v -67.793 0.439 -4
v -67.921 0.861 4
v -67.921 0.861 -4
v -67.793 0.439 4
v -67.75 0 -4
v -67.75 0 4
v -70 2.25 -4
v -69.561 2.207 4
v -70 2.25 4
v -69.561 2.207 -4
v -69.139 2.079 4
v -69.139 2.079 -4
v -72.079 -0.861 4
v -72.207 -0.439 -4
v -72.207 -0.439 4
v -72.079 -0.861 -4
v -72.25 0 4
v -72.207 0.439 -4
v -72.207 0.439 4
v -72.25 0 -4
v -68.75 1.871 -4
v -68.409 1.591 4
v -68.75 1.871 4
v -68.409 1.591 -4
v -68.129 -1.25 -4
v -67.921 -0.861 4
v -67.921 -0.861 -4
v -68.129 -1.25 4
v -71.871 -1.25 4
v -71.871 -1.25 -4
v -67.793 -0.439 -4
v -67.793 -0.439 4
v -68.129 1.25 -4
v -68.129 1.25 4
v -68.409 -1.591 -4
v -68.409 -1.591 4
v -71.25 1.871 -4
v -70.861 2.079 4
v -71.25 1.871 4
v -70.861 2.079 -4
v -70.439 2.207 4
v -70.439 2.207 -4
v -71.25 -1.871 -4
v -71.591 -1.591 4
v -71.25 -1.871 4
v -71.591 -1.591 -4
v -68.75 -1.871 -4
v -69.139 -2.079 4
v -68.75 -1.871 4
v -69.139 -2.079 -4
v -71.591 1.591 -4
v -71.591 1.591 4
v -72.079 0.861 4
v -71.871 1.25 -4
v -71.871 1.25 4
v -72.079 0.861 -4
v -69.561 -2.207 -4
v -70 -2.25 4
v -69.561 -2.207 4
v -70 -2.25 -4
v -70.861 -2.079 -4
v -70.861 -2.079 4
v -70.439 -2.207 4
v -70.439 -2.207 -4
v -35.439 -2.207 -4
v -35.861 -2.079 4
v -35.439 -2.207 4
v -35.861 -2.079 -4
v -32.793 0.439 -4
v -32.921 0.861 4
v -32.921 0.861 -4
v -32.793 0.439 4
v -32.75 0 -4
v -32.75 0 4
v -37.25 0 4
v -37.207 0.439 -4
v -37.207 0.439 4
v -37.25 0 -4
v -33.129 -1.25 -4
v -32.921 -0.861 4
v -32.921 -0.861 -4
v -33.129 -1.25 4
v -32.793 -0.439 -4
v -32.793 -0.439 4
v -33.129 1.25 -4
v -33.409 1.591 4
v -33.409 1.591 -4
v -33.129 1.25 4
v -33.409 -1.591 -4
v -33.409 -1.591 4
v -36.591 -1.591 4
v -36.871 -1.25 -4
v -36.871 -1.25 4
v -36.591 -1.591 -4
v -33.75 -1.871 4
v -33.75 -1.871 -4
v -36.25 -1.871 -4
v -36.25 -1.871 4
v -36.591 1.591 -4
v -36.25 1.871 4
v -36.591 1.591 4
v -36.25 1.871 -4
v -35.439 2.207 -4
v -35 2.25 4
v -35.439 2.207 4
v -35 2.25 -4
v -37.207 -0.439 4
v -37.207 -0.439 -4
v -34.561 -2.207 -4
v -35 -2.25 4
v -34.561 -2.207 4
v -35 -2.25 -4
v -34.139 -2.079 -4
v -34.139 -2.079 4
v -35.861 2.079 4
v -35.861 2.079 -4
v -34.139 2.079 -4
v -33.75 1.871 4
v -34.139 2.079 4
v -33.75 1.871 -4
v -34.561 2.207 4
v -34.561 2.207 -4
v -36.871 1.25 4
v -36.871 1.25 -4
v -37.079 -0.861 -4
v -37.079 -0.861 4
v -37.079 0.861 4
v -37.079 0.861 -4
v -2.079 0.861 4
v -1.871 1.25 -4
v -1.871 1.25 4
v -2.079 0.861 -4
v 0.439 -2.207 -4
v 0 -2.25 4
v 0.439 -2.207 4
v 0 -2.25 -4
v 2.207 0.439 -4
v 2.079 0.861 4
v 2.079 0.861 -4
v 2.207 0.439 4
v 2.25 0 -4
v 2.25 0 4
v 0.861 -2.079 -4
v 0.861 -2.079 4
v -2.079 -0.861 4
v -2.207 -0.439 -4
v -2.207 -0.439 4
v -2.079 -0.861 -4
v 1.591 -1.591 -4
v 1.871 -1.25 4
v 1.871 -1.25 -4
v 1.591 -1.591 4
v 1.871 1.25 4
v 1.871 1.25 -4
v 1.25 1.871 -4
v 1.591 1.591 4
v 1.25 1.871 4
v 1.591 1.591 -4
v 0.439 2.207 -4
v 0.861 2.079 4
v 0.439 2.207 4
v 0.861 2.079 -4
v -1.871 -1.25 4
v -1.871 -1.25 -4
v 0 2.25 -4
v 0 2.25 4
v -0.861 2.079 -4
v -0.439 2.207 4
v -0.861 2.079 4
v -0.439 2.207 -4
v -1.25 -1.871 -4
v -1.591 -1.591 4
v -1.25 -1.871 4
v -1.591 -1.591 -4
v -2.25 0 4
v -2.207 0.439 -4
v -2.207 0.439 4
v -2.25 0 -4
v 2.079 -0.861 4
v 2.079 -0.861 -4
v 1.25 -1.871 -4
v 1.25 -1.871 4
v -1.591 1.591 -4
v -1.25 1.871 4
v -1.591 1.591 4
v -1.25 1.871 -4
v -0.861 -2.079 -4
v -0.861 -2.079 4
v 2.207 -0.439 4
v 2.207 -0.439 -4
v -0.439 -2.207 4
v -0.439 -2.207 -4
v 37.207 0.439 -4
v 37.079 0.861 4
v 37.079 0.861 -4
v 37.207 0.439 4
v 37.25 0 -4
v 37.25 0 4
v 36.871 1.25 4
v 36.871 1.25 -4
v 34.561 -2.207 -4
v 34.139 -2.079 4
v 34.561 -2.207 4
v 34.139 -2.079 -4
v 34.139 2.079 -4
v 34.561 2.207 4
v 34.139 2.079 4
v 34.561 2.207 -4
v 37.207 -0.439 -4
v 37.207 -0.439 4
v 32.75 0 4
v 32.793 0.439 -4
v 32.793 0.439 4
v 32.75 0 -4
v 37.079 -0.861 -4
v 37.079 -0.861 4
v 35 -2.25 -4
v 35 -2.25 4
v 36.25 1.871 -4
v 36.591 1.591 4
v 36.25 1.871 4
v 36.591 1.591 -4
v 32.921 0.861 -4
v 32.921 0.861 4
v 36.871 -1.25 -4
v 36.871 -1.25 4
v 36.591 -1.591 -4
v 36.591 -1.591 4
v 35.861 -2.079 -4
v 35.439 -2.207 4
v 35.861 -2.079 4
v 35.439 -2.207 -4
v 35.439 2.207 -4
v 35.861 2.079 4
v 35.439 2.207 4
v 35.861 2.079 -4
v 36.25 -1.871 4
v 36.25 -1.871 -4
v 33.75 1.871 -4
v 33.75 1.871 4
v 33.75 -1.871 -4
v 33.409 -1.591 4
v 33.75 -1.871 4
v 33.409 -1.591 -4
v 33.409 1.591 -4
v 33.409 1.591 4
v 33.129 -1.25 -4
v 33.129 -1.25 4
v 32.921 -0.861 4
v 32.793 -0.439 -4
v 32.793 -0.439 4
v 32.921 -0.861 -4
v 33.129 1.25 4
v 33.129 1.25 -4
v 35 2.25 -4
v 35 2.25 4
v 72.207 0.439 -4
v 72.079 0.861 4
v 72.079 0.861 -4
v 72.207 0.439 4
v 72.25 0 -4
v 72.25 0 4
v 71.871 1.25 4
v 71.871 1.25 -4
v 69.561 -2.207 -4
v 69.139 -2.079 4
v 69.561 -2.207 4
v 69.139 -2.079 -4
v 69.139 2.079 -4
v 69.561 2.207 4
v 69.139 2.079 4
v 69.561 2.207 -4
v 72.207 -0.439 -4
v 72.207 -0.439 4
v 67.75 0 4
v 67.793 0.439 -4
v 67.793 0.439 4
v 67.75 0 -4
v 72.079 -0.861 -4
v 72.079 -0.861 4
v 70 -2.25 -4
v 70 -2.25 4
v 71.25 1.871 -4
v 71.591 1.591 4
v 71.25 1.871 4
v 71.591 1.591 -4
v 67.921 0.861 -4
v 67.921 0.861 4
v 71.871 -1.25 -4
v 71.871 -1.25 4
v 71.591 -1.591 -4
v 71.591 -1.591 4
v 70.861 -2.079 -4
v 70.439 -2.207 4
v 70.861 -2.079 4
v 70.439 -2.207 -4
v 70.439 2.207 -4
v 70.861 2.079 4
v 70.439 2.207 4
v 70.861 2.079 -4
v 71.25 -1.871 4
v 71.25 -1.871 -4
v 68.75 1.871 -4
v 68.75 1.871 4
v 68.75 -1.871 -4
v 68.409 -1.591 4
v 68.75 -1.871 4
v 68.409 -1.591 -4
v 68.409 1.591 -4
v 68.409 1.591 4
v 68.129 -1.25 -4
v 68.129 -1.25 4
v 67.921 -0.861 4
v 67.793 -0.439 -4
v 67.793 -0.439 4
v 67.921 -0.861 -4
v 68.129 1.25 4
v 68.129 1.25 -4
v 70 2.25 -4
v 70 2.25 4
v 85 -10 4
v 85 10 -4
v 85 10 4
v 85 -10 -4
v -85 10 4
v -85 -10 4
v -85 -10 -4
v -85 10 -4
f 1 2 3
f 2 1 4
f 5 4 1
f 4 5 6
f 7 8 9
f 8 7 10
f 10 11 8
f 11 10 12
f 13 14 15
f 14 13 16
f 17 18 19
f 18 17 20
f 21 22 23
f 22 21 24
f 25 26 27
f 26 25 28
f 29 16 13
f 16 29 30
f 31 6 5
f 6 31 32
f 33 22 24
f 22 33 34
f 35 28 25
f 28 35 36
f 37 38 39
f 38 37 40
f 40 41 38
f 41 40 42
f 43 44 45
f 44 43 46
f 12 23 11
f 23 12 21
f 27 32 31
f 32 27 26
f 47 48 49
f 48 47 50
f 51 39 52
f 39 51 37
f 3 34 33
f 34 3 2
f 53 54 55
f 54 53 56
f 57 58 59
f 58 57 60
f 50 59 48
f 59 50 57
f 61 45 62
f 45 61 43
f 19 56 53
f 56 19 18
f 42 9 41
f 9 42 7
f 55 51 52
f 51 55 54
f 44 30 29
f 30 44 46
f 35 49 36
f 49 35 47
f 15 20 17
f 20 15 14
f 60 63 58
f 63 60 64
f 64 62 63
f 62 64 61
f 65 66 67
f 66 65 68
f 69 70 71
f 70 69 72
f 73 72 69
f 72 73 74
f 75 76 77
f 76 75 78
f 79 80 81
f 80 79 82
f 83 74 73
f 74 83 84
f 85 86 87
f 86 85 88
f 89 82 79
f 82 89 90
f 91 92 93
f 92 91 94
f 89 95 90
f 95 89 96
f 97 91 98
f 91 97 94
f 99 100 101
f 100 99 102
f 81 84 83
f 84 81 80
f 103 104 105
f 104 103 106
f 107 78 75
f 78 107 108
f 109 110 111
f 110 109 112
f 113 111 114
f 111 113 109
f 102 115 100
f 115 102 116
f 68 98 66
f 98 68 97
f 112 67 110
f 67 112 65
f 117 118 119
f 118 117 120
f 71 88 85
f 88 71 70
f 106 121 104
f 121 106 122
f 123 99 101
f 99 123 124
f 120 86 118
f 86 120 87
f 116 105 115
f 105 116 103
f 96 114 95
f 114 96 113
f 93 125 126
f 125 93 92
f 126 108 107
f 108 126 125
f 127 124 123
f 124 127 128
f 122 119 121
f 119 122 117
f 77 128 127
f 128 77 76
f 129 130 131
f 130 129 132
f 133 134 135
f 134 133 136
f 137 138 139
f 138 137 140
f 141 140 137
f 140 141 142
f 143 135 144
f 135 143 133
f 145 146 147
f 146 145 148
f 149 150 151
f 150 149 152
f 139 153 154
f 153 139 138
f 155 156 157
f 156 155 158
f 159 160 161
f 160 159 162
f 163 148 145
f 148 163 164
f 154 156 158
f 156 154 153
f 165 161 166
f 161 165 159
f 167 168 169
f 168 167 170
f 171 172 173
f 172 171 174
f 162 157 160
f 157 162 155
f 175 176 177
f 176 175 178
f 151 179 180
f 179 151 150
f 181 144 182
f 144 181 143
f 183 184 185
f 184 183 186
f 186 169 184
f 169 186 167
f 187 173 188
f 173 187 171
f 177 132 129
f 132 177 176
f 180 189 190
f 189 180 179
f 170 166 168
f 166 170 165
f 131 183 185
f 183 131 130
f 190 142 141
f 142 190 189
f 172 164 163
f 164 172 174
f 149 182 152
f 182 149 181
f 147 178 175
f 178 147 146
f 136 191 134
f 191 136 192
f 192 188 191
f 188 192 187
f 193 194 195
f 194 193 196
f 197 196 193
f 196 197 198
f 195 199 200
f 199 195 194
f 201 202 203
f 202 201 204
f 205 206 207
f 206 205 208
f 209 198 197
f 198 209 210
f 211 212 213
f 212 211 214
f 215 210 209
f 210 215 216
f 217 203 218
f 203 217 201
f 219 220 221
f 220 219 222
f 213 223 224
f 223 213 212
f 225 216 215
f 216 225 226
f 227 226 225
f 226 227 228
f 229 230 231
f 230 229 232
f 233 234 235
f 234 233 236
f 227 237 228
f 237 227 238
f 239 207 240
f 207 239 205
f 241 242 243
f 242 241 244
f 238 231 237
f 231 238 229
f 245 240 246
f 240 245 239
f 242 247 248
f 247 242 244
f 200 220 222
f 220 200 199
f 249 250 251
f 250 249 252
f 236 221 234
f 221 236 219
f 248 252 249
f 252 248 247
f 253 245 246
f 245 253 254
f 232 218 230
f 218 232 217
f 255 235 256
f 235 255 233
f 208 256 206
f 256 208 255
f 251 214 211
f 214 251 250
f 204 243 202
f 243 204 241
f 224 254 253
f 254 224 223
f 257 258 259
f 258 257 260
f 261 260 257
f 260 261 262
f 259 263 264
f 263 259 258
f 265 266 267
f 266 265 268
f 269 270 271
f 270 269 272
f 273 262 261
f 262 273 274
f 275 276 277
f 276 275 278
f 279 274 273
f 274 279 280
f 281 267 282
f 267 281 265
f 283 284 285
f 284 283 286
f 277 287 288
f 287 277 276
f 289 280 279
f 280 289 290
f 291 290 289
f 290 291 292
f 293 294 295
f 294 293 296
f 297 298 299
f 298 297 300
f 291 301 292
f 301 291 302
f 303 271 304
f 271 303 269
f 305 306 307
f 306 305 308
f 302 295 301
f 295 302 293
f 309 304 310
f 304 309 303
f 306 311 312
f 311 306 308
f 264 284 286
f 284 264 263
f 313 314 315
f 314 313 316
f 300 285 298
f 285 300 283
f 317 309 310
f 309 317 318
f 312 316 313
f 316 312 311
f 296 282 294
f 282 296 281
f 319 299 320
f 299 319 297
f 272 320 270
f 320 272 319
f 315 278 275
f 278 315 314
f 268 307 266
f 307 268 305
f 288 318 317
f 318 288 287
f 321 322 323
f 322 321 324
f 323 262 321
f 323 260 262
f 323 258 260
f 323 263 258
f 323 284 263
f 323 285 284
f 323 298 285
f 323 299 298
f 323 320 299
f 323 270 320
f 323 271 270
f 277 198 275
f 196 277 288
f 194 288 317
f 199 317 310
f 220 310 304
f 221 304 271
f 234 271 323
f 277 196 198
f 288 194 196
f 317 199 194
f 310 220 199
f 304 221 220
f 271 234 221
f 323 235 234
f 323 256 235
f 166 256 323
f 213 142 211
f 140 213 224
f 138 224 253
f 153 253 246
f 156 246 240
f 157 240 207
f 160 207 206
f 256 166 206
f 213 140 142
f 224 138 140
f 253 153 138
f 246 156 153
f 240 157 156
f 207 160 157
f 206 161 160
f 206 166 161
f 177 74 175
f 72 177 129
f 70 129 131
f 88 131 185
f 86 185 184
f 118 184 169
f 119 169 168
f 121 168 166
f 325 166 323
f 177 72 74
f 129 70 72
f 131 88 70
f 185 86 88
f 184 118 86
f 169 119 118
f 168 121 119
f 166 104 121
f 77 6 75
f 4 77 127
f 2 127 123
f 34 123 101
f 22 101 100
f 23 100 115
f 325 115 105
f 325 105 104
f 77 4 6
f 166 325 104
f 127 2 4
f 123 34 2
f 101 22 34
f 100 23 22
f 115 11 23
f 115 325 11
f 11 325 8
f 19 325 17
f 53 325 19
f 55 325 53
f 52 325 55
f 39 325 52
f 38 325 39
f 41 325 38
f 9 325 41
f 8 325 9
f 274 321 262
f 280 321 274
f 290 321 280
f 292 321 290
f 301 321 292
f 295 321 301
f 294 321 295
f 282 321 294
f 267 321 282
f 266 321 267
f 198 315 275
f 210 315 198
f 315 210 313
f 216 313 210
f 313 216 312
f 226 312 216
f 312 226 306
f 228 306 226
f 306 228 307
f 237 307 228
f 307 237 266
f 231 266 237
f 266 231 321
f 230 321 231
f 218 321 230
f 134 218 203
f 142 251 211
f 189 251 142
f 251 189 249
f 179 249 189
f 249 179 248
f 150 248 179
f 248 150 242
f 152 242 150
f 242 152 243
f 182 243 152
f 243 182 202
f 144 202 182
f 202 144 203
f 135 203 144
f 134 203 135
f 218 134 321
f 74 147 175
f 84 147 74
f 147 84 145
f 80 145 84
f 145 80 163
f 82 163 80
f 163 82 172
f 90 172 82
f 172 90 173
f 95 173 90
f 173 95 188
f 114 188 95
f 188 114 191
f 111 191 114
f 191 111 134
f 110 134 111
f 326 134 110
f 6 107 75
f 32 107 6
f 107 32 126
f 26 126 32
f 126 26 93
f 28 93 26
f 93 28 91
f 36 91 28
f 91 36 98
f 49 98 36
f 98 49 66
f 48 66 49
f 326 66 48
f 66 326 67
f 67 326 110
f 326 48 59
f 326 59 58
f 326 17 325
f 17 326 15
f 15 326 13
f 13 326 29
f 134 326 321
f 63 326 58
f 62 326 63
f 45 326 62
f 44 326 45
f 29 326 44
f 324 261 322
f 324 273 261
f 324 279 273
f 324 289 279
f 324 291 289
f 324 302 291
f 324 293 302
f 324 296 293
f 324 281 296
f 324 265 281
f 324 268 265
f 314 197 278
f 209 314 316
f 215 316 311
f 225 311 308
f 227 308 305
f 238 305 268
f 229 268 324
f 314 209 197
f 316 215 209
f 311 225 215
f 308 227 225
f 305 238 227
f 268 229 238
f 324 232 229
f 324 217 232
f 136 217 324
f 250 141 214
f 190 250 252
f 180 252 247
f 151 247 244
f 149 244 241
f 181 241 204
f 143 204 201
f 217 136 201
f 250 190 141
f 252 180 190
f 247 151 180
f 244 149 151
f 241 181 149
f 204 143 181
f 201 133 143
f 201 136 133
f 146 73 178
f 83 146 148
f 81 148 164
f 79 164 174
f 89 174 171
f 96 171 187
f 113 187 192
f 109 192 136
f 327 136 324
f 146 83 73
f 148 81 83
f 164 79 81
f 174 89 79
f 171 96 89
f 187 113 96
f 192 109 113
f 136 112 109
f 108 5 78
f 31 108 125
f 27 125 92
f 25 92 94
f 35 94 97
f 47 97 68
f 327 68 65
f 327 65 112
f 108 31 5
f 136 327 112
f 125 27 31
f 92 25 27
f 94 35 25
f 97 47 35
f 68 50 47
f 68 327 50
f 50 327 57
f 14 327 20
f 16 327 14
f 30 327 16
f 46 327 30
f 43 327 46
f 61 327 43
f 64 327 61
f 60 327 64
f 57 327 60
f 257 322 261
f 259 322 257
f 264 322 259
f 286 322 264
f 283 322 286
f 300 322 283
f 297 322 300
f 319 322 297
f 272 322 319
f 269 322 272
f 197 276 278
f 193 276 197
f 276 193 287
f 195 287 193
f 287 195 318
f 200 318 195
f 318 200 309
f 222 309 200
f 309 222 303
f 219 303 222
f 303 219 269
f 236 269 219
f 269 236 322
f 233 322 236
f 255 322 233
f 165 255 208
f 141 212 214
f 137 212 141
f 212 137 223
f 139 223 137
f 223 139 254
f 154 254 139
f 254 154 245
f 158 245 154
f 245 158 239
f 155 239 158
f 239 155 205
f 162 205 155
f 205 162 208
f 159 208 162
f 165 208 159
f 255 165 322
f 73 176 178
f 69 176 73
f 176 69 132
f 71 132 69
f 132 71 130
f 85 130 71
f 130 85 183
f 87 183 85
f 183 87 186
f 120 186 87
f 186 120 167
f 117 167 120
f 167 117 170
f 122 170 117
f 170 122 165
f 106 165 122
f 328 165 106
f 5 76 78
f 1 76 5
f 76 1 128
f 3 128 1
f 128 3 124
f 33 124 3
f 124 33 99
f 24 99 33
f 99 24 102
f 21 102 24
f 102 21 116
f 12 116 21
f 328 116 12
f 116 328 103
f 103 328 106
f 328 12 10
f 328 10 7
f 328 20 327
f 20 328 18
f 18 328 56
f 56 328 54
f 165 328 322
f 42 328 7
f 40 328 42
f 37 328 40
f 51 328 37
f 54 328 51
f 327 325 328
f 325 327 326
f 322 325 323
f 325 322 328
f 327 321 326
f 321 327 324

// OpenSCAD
$fn = 32;

// ----------------------------------------------------------------------
// Hole bar, 5 x Ø4.5
// skip layout, 15 mm edge offset
// ----------------------------------------------------------------------

// --- parameters (mm) ---
bar_w = 20;         // bar width (Y)
bar_t = 8;          // bar thickness (Z)
holes = 5;          // holes per row
hole_d = 4.5;       // hole diameter
edge = 15;          // offset from the bar end to the first hole
grid_pitch = 17.5;  // grid the bar was laid out on

// --- derived feature positions (mm) ---
pitch = grid_pitch * 2;       // = 35   holes sit every other grid slot
span = (holes - 1) * pitch;   // = 140   distance between the end holes
bar_l = span + 2 * edge;      // = 170   overall bar length
start_x = -bar_l / 2 + edge;  // = -70   X of the first hole
feature_centers = [
  [start_x + 0 * pitch, 0],
  [start_x + 1 * pitch, 0],
  [start_x + 2 * pitch, 0],
  [start_x + 3 * pitch, 0],
  [start_x + 4 * pitch, 0]
];   // hole centres of the first row

// bar with one row of holes, drilled from feature_centers
difference() {
  translate([-bar_l / 2, -bar_w / 2, -bar_t / 2]) cube([bar_l, bar_w, bar_t]);
  for (centre = feature_centers)
    translate([centre[0], centre[1], 0])
      cylinder(d = hole_d, h = bar_t + 2, center = true);
}
